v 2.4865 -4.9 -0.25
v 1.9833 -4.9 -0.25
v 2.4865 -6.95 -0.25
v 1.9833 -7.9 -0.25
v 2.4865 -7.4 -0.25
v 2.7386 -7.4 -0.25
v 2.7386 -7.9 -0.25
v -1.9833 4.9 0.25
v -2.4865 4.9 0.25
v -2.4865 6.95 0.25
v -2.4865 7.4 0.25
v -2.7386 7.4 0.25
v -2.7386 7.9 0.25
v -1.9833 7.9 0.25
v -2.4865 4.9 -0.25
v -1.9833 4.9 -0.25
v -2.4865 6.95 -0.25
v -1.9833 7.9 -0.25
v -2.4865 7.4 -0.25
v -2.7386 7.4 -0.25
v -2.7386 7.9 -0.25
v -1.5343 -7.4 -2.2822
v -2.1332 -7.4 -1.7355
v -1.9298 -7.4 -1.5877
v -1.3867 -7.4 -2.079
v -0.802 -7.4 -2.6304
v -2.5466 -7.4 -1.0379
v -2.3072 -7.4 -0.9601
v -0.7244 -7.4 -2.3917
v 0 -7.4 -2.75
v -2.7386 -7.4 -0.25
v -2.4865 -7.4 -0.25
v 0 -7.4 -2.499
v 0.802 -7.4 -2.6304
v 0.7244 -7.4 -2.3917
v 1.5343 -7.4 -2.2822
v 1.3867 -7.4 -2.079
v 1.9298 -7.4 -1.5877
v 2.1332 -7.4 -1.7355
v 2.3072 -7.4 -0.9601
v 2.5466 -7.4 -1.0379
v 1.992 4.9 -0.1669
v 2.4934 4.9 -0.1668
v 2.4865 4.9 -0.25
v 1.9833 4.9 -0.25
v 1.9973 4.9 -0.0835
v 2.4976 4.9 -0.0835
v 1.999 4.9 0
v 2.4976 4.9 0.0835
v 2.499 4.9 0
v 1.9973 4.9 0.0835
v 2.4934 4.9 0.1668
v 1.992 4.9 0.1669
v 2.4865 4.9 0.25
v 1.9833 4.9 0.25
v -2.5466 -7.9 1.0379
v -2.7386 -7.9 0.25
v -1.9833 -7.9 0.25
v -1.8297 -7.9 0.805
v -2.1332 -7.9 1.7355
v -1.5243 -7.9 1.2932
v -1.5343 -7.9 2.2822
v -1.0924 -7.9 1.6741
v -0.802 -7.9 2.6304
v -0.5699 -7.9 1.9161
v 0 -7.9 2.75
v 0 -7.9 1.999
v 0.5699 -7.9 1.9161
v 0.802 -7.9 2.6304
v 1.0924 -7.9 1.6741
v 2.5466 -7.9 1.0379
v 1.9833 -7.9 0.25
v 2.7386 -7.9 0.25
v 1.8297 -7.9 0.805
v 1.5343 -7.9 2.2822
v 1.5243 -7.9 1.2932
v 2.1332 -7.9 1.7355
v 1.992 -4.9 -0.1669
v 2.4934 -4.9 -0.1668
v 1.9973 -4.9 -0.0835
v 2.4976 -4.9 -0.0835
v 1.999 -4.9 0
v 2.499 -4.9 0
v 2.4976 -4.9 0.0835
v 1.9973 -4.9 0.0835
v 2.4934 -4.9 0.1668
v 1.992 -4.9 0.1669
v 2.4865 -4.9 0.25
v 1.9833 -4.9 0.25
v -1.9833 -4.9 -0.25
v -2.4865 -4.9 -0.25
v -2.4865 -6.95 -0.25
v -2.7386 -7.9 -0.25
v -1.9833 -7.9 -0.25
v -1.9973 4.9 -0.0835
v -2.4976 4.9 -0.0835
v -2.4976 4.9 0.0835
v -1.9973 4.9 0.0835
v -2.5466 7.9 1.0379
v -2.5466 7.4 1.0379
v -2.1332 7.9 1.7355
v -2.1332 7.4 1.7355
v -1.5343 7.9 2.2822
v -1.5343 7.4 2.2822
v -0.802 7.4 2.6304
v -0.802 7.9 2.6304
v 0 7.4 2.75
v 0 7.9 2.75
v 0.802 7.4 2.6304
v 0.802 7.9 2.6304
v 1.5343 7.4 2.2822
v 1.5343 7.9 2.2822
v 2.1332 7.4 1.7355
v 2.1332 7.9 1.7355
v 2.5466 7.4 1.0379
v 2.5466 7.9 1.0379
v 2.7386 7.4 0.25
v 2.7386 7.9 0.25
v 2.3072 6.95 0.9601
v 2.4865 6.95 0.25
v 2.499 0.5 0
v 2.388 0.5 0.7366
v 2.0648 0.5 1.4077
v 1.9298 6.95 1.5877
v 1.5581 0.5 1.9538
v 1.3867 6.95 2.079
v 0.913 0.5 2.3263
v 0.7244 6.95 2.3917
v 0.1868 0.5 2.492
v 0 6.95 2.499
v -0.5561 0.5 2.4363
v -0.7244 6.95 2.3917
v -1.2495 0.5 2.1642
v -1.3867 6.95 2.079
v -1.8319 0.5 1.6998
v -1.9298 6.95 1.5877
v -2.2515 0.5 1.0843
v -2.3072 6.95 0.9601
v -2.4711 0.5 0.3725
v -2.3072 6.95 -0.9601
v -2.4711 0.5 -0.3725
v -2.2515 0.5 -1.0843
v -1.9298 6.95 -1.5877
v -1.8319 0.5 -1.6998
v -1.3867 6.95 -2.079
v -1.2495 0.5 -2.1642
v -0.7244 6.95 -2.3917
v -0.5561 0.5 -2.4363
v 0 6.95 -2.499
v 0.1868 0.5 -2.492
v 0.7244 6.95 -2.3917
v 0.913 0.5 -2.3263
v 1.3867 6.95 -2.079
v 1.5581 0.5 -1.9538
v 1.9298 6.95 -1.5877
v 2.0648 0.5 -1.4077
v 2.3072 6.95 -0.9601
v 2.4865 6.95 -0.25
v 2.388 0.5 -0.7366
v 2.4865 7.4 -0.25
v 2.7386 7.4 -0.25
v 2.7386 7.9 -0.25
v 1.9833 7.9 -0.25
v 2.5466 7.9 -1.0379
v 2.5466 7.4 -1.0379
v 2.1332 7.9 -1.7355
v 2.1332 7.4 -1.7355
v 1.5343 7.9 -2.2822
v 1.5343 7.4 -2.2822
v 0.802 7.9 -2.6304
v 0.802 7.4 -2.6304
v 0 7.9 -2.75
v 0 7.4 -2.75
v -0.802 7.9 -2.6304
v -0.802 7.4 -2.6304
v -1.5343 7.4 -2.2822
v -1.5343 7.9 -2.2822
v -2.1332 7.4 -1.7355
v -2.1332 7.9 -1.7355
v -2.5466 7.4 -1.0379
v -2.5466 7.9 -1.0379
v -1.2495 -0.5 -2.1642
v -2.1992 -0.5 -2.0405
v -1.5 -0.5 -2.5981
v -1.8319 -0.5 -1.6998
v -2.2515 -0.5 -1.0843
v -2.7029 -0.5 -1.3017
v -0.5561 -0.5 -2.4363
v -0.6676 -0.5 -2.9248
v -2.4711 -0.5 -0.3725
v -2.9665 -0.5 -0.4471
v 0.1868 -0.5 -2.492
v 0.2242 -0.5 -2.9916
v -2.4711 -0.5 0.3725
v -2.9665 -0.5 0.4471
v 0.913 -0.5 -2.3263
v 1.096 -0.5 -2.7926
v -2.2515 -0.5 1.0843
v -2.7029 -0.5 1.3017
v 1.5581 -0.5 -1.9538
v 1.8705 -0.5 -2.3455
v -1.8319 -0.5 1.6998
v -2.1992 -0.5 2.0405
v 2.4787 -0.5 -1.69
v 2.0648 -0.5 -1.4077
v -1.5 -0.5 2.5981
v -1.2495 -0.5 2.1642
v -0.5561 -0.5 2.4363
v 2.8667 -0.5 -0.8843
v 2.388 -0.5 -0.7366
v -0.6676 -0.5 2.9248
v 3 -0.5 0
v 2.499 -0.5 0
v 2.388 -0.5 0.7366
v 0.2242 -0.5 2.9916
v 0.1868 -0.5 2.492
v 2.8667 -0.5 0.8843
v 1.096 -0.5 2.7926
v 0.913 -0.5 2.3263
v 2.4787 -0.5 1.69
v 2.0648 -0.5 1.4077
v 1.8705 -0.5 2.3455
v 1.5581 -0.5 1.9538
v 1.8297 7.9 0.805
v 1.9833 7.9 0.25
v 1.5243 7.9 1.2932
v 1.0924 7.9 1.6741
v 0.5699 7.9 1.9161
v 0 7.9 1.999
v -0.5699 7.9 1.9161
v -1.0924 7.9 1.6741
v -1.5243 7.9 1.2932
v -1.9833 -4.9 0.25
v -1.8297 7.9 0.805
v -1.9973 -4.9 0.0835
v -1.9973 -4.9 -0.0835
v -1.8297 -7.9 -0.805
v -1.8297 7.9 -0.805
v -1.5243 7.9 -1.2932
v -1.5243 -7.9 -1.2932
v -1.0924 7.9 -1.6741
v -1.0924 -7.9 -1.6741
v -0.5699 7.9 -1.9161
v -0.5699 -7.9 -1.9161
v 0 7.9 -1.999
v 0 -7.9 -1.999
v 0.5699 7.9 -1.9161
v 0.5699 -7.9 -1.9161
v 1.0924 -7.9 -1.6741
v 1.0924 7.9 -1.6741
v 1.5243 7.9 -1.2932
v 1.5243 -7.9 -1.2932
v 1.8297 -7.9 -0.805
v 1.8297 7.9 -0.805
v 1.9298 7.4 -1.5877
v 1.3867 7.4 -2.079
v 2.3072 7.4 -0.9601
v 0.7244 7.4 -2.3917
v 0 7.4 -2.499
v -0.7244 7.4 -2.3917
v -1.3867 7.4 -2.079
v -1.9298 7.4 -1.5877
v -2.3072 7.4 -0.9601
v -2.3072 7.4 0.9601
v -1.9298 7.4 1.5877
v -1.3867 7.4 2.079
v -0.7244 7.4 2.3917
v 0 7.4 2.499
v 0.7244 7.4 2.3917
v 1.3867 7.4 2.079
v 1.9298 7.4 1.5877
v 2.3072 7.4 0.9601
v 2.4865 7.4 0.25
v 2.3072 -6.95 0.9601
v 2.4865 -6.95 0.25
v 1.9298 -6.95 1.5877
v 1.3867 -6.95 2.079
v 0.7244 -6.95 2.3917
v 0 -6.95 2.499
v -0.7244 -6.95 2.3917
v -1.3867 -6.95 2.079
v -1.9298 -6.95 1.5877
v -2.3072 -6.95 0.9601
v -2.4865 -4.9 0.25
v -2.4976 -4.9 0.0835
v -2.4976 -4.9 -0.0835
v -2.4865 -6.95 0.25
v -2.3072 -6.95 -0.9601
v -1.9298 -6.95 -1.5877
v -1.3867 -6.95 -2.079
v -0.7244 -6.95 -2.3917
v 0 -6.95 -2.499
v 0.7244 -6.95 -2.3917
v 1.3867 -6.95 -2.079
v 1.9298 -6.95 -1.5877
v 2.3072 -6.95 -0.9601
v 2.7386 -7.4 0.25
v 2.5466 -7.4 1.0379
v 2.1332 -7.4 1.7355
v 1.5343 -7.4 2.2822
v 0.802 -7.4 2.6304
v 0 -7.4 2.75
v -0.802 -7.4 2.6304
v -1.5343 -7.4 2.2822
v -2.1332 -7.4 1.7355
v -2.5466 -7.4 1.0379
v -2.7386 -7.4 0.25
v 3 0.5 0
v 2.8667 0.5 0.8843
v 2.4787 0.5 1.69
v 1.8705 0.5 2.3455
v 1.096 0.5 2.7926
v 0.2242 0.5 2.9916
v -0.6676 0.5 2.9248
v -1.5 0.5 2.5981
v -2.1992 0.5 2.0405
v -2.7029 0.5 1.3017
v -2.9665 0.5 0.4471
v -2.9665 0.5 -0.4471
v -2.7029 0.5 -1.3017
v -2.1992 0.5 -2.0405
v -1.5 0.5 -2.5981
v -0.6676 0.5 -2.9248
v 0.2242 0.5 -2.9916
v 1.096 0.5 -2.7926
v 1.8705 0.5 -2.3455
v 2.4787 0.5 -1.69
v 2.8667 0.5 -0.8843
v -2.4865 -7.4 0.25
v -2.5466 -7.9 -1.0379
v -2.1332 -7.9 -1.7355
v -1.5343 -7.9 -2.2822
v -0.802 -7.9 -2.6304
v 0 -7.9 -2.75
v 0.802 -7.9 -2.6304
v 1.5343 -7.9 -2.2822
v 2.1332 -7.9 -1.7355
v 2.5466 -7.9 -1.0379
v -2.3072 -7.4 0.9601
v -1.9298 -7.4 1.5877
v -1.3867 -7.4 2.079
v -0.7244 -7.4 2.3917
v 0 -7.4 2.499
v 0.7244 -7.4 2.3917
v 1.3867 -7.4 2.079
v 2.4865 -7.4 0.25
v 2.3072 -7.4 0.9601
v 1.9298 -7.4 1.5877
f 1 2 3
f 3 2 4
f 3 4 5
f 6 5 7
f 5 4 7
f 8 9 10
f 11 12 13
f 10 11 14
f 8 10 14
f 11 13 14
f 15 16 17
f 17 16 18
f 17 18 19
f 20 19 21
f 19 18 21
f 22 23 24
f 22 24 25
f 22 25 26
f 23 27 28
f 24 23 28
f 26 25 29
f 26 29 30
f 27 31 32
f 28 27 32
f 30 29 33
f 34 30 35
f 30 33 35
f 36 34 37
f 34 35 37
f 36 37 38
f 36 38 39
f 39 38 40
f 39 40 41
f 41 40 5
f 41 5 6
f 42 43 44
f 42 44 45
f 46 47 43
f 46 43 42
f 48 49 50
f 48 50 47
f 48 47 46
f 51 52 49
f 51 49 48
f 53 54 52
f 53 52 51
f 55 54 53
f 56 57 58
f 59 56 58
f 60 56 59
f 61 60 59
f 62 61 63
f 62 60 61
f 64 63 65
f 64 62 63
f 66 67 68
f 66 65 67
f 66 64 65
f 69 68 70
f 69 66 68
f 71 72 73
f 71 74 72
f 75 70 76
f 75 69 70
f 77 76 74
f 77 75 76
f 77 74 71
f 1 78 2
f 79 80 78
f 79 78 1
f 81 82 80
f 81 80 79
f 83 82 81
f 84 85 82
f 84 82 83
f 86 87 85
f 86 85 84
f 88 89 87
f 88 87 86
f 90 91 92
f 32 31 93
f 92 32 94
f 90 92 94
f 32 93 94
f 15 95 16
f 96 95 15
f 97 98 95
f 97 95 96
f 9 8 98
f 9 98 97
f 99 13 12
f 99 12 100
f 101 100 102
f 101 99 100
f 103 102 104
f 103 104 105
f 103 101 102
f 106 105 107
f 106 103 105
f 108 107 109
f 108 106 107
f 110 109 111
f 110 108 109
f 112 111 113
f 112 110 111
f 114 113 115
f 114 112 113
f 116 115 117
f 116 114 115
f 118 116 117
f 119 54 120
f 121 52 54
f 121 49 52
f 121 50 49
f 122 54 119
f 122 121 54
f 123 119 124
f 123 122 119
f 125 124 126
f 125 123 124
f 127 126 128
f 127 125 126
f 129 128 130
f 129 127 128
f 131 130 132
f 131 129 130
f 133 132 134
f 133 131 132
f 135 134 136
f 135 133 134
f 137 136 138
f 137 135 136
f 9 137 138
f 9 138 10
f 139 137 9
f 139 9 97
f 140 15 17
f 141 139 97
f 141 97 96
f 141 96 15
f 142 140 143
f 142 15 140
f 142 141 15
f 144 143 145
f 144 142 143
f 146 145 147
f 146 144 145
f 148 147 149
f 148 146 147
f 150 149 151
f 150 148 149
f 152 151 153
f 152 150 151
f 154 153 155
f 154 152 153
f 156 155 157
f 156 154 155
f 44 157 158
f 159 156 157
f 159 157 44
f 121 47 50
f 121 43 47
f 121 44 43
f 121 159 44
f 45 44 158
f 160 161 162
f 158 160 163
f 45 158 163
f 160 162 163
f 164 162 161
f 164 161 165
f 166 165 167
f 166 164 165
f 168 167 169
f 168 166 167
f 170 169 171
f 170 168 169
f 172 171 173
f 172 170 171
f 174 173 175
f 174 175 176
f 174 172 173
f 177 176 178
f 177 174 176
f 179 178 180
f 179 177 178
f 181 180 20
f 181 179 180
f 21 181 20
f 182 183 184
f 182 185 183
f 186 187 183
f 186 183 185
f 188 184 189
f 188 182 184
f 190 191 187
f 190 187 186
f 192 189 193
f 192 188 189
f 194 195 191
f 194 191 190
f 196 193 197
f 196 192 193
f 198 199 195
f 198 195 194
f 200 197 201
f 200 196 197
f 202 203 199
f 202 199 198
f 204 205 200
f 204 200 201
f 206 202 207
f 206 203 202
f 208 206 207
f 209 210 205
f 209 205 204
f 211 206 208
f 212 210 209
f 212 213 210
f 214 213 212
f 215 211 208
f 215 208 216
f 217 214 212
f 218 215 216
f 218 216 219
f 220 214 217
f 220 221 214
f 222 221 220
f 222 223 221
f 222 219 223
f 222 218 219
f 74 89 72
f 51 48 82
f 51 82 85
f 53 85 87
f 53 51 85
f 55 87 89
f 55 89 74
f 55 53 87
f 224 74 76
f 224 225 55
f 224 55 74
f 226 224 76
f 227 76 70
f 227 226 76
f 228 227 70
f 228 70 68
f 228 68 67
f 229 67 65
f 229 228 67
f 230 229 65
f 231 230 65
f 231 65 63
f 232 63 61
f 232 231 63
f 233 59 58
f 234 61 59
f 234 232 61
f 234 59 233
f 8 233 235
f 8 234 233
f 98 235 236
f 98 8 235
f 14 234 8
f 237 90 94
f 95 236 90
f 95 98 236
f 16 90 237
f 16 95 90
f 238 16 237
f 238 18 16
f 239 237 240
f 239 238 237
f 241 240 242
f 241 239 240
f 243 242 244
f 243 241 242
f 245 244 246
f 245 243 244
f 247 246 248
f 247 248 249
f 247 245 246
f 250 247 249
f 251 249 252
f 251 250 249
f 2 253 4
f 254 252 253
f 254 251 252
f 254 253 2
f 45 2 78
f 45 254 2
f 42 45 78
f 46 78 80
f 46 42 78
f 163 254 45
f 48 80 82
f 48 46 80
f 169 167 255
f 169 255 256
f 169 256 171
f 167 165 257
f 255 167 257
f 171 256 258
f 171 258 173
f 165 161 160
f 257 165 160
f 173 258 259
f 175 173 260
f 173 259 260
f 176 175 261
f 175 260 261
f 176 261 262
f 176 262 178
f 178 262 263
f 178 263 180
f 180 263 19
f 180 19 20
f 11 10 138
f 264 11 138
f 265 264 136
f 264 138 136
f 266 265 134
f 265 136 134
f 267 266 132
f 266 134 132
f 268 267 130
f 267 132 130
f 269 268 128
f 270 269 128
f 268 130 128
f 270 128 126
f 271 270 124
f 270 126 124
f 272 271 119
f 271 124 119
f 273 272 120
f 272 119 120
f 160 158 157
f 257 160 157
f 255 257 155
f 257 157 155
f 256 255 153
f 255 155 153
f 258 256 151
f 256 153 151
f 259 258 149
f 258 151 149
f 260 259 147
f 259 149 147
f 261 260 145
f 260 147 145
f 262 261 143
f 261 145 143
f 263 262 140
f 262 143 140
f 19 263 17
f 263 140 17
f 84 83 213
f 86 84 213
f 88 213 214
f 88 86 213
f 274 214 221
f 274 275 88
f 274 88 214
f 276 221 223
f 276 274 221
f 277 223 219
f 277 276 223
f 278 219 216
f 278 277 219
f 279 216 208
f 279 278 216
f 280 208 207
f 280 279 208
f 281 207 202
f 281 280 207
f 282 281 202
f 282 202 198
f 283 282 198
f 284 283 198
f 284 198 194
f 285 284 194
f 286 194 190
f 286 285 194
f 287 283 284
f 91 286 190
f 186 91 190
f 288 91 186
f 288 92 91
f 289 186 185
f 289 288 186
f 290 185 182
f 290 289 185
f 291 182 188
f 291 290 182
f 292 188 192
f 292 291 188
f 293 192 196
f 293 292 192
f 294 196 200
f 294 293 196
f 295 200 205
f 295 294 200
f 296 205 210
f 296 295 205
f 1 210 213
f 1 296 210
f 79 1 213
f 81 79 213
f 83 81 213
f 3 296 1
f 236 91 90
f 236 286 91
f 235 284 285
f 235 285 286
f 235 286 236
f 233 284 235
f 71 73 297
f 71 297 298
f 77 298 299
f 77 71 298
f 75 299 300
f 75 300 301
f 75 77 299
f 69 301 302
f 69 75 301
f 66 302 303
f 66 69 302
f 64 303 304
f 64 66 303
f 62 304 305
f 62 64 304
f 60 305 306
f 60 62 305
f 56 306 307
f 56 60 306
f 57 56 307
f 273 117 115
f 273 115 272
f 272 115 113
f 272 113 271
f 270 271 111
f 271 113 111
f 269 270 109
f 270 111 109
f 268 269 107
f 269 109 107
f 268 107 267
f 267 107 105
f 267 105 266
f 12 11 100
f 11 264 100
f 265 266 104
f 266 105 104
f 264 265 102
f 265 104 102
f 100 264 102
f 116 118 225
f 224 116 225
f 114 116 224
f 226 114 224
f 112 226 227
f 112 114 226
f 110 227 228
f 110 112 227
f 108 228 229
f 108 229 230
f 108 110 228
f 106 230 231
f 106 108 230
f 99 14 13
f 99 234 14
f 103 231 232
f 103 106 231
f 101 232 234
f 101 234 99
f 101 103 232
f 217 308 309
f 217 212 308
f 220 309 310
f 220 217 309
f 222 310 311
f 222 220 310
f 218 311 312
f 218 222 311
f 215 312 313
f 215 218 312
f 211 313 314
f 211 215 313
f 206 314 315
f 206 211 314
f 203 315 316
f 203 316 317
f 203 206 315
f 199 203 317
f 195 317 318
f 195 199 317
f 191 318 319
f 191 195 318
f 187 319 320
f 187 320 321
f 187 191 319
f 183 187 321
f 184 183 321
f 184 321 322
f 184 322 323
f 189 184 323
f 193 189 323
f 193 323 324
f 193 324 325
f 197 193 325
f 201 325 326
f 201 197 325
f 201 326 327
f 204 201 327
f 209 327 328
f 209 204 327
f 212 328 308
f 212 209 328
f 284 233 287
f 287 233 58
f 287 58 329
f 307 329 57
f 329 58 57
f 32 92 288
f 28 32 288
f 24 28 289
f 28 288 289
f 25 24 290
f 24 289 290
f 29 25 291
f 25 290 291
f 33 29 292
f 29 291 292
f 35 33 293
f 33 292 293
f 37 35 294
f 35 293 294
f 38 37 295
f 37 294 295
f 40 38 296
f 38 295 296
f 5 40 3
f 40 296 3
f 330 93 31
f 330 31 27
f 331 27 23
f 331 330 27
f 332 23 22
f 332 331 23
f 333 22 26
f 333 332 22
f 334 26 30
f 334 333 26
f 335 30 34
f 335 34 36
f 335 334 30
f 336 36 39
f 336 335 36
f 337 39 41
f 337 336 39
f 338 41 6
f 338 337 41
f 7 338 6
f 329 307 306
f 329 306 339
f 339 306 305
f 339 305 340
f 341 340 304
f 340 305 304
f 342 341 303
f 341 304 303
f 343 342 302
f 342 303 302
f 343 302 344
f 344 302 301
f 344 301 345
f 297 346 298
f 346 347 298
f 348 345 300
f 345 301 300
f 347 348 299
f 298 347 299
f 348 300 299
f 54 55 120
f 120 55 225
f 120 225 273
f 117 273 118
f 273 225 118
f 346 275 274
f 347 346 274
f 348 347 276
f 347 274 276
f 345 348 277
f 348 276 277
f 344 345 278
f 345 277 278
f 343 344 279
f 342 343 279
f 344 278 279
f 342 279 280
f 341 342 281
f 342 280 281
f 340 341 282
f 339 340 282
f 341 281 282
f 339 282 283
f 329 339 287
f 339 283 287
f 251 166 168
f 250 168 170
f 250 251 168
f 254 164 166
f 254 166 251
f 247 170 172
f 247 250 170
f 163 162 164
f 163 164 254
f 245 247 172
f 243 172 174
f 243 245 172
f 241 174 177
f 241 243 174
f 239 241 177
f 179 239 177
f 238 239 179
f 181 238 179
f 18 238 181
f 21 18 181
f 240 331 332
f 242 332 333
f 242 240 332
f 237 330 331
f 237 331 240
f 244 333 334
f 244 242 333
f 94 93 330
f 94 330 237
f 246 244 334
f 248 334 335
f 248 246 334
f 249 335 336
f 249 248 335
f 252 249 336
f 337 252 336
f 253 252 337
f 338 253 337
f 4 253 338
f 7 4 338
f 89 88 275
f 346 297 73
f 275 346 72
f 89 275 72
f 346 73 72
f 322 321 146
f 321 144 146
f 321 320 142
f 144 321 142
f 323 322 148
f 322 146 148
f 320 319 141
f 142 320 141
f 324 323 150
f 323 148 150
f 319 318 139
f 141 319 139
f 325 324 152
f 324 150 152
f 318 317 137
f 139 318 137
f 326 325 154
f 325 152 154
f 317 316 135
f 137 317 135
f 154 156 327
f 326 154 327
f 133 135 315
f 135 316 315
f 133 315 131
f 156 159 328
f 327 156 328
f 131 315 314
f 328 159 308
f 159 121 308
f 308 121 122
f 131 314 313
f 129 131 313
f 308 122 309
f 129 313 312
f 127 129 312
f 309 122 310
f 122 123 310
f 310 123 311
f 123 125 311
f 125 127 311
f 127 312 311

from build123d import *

# Parameters (mm, degrees)
F0_R      = 3
F0_R_2    = 2.499
F1_DEPTH  = 0.5
F0_R_3    = 1.999
F2_DEPTH  = 7.95
F3_R      = 2.75
F3_R_2    = 2.499
F3_R_3    = 1.999
F4_DEPTH  = 1
F6_DEPTH  = 3
F7_R      = 2.75
F7_R_2    = 2.499
F8_DEPTH  = 1
F10_DEPTH = 3
F11_DEPTH = 0.05
F12_DEPTH = 0.05
F13_DEPTH = 0.45
F14_DEPTH = 0.45


with BuildPart() as f1:
    # F0 (on Front) → F1 (new body, symmetric)
    with BuildSketch(Plane.XZ):
        Circle(F0_R)
        Circle(F0_R_2, mode=Mode.SUBTRACT)
    extrude(amount=F1_DEPTH, both=True)

    # F0 (on Front) → F2 (join, symmetric)
    with BuildSketch(Plane.XZ):
        Circle(F0_R_2)
        Circle(F0_R_3, mode=Mode.SUBTRACT)
    extrude(amount=F2_DEPTH, both=True)

    # F3 (on face) → F4 (join)
    with BuildSketch(Plane.XZ.offset(7.95)):
        Circle(F3_R)
        Circle(F3_R_2, mode=Mode.SUBTRACT)
        Circle(F3_R_2)
        Circle(F3_R_3, mode=Mode.SUBTRACT)
    extrude(amount=-F4_DEPTH)

    # F5 (on face) → F6 (cut)
    with BuildSketch(Plane.XZ.offset(7.95)):
        with BuildLine():
            Line((1.983305574, -0.25), (2.7386127875, -0.25))
            ThreePointArc((2.7386127875, -0.25), (2.75, 0), (2.7386127875, 0.25))
            Line((2.7386127875, 0.25), (1.983305574, 0.25))
            ThreePointArc((1.983305574, 0.25), (1.999, 0), (1.983305574, -0.25))
        make_face()
        with BuildLine():
            ThreePointArc((-1.983305574, -0.25), (-1.999, 0), (-1.983305574, 0.25))
            Line((-1.983305574, 0.25), (-2.7386127875, 0.25))
            ThreePointArc((-2.7386127875, 0.25), (-2.75, 0), (-2.7386127875, -0.25))
            Line((-2.7386127875, -0.25), (-1.983305574, -0.25))
        make_face()
    extrude(amount=-F6_DEPTH, mode=Mode.SUBTRACT)

    # F7 (on face) → F8 (join)
    with BuildSketch(Plane(origin=(0, 7.95, 0), x_dir=(-1, 0, 0), z_dir=(0, 1, 0))):
        Circle(F7_R)
        Circle(F7_R_2, mode=Mode.SUBTRACT)
    extrude(amount=-F8_DEPTH)

    # F9 (on face) → F10 (cut)
    with BuildSketch(Plane(origin=(0, 7.95, 0), x_dir=(-1, 0, 0), z_dir=(0, 1, 0))):
        with BuildLine():
            ThreePointArc((2.7386127875, -0.25), (2.75, 0), (2.7386127875, 0.25))
            Line((2.7386127875, 0.25), (1.983305574, 0.25))
            ThreePointArc((1.983305574, 0.25), (1.999, 0), (1.983305574, -0.25))
            Line((1.983305574, -0.25), (2.7386127875, -0.25))
        make_face()
        with BuildLine():
            Line((-1.983305574, 0.25), (-2.7386127875, 0.25))
            ThreePointArc((-2.7386127875, 0.25), (-2.75, 0), (-2.7386127875, -0.25))
            Line((-2.7386127875, -0.25), (-1.983305574, -0.25))
            ThreePointArc((-1.983305574, -0.25), (-1.999, 0), (-1.983305574, 0.25))
        make_face()
    extrude(amount=-F10_DEPTH, mode=Mode.SUBTRACT)

    # F11 (cut): faces of the model
    f11_faces = [f1.faces().sort_by_distance(p)[0] for p in [
        (-2.3609591808, 7.95, 0.3102079729),
        (2.2442931831, 4.95, 0),
        (0, 7.95, -2.6897920271),
        (-2.2442931831, 4.95, 0),
    ]]
    extrude(f11_faces, amount=-F11_DEPTH, mode=Mode.SUBTRACT)

    # F12 (cut): faces of the model
    f12_faces = [f1.faces().sort_by_distance(p)[0] for p in [
        (0, -7.95, 2.0592079729),
        (-2.2442931831, -4.95, 0),
        (2.3609591808, -7.95, -0.3102079729),
        (2.2442931831, -4.95, 0),
    ]]
    extrude(f12_faces, amount=-F12_DEPTH, mode=Mode.SUBTRACT)

    # F13 (cut): faces of the model
    f13_faces = [f1.faces().sort_by_distance(p)[0] for p in [
        (-2.6125381702, 6.95, 0.3102079729),
        (0, 6.95, -2.6897920271),
    ]]
    extrude(f13_faces, amount=-F13_DEPTH, mode=Mode.SUBTRACT)

    # F14 (cut): faces of the model
    f14_faces = [f1.faces().sort_by_distance(p)[0] for p in [
        (2.6125381702, -6.95, 0.3102079729),
        (0, -6.95, -2.6897920271),
    ]]
    extrude(f14_faces, amount=-F14_DEPTH, mode=Mode.SUBTRACT)


solid = f1.part
